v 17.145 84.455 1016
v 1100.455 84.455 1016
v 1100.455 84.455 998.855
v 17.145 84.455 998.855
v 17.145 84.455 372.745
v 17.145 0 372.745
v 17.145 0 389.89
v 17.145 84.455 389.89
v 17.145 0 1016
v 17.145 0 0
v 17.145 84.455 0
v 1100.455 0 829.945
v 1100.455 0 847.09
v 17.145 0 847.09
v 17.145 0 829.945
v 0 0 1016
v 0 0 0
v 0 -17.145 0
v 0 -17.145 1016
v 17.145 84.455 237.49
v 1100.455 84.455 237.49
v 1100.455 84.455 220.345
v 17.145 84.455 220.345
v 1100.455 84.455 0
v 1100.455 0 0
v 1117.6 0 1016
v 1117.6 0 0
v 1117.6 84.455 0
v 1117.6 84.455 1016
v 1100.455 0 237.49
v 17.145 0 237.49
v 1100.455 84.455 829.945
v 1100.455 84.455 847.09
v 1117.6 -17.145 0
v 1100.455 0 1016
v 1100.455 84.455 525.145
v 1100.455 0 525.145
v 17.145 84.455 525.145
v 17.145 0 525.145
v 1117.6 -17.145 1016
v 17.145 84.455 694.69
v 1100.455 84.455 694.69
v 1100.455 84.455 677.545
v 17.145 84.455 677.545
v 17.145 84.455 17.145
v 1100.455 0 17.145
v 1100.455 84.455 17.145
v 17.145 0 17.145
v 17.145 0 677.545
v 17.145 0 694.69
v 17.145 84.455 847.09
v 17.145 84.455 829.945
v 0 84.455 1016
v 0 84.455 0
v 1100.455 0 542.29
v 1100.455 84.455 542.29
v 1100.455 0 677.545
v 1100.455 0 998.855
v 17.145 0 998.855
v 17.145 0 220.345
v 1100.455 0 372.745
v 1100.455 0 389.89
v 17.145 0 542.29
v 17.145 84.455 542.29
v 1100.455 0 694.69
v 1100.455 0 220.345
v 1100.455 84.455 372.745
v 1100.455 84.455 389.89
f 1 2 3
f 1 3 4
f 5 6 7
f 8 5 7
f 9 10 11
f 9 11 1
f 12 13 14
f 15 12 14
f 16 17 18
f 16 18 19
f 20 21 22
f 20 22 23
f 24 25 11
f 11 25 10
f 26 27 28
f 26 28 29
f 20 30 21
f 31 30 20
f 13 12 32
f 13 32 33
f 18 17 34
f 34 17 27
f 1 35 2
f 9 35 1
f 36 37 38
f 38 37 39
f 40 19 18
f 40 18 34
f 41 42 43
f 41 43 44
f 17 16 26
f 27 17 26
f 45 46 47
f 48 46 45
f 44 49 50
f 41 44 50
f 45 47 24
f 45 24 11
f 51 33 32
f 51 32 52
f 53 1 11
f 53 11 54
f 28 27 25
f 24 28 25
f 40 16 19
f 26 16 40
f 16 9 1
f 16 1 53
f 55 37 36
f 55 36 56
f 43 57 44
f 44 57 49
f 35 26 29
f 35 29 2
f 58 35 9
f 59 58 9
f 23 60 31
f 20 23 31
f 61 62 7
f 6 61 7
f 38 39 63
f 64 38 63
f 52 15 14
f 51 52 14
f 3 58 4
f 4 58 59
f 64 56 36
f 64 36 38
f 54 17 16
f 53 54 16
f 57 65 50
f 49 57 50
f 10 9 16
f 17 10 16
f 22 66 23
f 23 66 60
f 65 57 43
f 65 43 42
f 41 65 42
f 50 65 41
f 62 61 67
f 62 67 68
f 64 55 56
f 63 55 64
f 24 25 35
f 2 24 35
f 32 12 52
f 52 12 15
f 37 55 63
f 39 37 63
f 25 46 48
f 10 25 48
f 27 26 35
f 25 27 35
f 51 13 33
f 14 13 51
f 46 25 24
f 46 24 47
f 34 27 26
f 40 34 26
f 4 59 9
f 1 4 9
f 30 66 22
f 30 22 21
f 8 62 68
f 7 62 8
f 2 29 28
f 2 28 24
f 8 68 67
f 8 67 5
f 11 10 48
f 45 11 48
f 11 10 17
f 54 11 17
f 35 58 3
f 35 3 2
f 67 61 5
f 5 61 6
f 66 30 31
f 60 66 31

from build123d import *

# Parameters (mm, degrees)
F0_W     = 1117.6
F0_H     = 1016
F1_DEPTH = 17.145
F2_W     = 17.145
F2_H     = 1016
F3_DEPTH = 84.455
F4_W     = 17.145
F4_H     = 1016
F5_DEPTH = 84.455
F6_W     = 1083.31
F6_H     = 17.145
F7_DEPTH = 84.455
F8_W     = 1083.31
F8_H     = 17.145
F9_DEPTH = 84.455


with BuildPart() as f1:
    # F0 (on Front) → F1 (new body)
    with BuildSketch(Plane.XZ):
        with Locations((558.8, 508)):
            Rectangle(F0_W, F0_H)
    extrude(amount=F1_DEPTH)


with BuildPart() as f3:
    # F2 (on face) → F3 (new body)
    with BuildSketch(Plane(origin=(0, 0, 0), x_dir=(-1, 0, 0), z_dir=(0, 1, 0))):
        with Locations((-8.5725, 508)):
            Rectangle(F2_W, F2_H)
    extrude(amount=F3_DEPTH)


with BuildPart() as f5:
    # F4 (on face) → F5 (new body)
    with BuildSketch(Plane(origin=(0, 0, 0), x_dir=(-1, 0, 0), z_dir=(0, 1, 0))):
        with Locations((-1109.0275, 508)):
            Rectangle(F4_W, F4_H)
    extrude(amount=F5_DEPTH)


with BuildPart() as f7:
    # F6 (on face) → F7 (new body)
    with BuildSketch(Plane(origin=(0, 0, 0), x_dir=(-1, 0, 0), z_dir=(0, 1, 0))):
        with Locations((-558.8, 1007.4275)):
            Rectangle(F6_W, F6_H)
        with Locations((-558.8, 8.5725)):
            Rectangle(F6_W, F6_H)
    extrude(amount=F7_DEPTH)


with BuildPart() as f9:
    # F8 (on face) → F9 (new body)
    with BuildSketch(Plane(origin=(0, 0, 0), x_dir=(-1, 0, 0), z_dir=(0, 1, 0))):
        with Locations((-558.8, 228.9175)):
            Rectangle(F8_W, F8_H)
        with Locations((-558.8, 381.3175)):
            Rectangle(F8_W, F8_H)
        with Locations((-558.8, 533.7175)):
            Rectangle(F8_W, F8_H)
        with Locations((-558.8, 686.1175)):
            Rectangle(F8_W, F8_H)
        with Locations((-558.8, 838.5175)):
            Rectangle(F8_W, F8_H)
    extrude(amount=F9_DEPTH)


solid = Compound([f1.part, f3.part, f5.part, f7.part, f9.part])
